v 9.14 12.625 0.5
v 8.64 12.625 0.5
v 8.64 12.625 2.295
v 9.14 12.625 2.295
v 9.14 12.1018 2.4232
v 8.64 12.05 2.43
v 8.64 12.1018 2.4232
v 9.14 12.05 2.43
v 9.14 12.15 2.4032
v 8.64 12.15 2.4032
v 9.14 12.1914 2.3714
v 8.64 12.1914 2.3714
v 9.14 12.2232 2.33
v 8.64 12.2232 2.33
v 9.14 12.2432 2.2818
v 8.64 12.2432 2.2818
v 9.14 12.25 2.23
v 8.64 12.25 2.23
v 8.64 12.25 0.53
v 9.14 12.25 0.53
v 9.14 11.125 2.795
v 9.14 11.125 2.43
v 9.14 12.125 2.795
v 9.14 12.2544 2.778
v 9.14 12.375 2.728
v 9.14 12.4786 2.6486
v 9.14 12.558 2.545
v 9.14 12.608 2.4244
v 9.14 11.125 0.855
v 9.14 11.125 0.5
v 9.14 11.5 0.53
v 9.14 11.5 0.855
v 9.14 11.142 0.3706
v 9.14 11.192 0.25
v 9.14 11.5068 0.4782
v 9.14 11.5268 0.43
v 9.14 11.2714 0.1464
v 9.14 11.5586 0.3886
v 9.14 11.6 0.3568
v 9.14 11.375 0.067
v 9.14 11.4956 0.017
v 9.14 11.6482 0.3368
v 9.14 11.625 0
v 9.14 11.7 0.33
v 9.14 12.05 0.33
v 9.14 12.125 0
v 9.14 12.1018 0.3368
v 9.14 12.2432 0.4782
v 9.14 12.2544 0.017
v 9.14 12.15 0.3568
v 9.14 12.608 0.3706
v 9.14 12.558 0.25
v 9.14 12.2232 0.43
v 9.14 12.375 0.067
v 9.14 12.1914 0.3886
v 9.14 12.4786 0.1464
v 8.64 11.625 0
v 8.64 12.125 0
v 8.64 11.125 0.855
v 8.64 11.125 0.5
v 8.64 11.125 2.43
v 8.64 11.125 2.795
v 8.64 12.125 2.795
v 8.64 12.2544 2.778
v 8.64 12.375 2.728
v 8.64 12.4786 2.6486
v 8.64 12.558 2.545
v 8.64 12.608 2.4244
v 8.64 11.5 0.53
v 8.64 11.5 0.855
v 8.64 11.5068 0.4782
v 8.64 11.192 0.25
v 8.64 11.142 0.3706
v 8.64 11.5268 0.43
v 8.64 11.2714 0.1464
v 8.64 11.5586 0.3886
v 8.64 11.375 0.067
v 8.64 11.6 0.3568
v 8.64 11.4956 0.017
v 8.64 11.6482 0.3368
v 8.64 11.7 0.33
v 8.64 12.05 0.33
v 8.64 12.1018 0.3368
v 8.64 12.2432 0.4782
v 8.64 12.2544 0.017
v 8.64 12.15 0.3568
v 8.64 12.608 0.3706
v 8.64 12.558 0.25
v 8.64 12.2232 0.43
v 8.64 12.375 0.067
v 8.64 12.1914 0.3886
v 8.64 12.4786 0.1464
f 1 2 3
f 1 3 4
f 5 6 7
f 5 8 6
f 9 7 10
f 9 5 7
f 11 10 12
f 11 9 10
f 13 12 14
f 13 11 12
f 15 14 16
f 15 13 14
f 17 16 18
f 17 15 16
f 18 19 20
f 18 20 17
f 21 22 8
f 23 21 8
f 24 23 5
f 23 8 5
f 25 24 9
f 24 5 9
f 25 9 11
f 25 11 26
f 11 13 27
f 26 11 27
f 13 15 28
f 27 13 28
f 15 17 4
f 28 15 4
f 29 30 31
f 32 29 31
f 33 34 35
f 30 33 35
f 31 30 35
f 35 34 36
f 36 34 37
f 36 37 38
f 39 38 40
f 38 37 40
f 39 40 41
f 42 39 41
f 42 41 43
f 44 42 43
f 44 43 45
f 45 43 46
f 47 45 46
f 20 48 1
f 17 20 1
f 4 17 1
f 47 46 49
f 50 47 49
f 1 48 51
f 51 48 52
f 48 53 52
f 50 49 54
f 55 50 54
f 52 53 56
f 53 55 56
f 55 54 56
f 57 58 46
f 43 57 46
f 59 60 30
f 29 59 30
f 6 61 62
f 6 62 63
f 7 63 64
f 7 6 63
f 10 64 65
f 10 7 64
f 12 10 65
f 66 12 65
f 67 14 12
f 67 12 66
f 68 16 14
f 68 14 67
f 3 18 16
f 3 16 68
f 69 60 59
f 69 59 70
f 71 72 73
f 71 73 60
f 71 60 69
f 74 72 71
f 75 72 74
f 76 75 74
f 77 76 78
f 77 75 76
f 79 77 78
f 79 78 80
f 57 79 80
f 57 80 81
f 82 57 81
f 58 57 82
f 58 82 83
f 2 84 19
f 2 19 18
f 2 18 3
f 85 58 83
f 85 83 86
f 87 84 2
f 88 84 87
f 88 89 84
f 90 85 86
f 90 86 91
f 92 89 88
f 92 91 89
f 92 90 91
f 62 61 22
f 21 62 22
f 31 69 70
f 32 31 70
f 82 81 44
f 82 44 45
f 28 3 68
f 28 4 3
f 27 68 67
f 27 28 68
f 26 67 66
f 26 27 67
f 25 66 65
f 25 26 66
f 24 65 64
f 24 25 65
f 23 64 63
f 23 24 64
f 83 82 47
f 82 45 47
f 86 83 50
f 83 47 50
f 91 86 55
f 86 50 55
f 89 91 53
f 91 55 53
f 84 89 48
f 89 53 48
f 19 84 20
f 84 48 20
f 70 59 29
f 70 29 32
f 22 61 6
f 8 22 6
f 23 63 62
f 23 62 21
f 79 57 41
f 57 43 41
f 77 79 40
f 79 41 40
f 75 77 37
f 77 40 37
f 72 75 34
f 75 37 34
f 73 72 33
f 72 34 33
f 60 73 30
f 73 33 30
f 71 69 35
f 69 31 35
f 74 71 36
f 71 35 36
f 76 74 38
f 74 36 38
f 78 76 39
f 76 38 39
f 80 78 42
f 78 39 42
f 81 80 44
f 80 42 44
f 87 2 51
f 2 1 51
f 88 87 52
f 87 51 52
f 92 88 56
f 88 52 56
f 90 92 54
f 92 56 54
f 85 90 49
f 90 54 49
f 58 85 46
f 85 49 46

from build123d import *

# Parameters (mm, degrees)
BOX086_W     = 0.5
BOX086_H     = 1.5
BOX086_DEPTH = 2.795
FILLET218_R  = 0.5
FILLET150_R  = 0.5
FILLET233_R  = 0.5
BOX082_W     = 0.75
BOX082_H     = 2.1
BOX082_DEPTH = 1
FILLET230_R  = 0.2
FILLET191_R  = 0.2
FILLET225_R  = 0.2
FILLET227_R  = 0.2
BOX083_W     = 1
BOX083_H     = 1.575
BOX083_DEPTH = 3


with BuildPart() as part:
    # Box086 → Box086 (join)
    with BuildSketch(Plane(origin=(-0.25, 11.125, 0), x_dir=(1, 0, 0), z_dir=(0, 0, 1))):
        with Locations((0.25, 0.75)):
            Rectangle(BOX086_W, BOX086_H)
    extrude(amount=BOX086_DEPTH)

    # Fillet218
    fillet218_edges = [part.edges().sort_by_distance(p)[0] for p in [
        (0, 12.625, 0),
    ]]
    fillet(fillet218_edges, radius=FILLET218_R)

    # Fillet150
    fillet150_edges = [part.edges().sort_by_distance(p)[0] for p in [
        (0, 12.625, 2.795),
    ]]
    fillet(fillet150_edges, radius=FILLET150_R)

    # Fillet233
    fillet233_edges = [part.edges().sort_by_distance(p)[0] for p in [
        (0, 11.125, 0),
    ]]
    fillet(fillet233_edges, radius=FILLET233_R)

    # Box082 → Box082 (cut)
    with BuildSketch(Plane(origin=(-0.5, 11.5, 0.33), x_dir=(0, 1, 0), z_dir=(1, 0, 0))):
        with Locations((0.375, 1.05)):
            Rectangle(BOX082_W, BOX082_H)
    extrude(amount=BOX082_DEPTH, mode=Mode.SUBTRACT)

    # Fillet230
    fillet230_edges = [part.edges().sort_by_distance(p)[0] for p in [
        (0, 11.5, 0.33),
    ]]
    fillet(fillet230_edges, radius=FILLET230_R)

    # Fillet191
    fillet191_edges = [part.edges().sort_by_distance(p)[0] for p in [
        (0, 12.25, 0.33),
    ]]
    fillet(fillet191_edges, radius=FILLET191_R)

    # Fillet225
    fillet225_edges = [part.edges().sort_by_distance(p)[0] for p in [
        (0, 11.5, 2.43),
    ]]
    fillet(fillet225_edges, radius=FILLET225_R)

    # Fillet227
    fillet227_edges = [part.edges().sort_by_distance(p)[0] for p in [
        (0, 12.25, 2.43),
    ]]
    fillet(fillet227_edges, radius=FILLET227_R)

    # Box083 → Box083 (cut)
    with BuildSketch(Plane(origin=(-1, 11, 0.855), x_dir=(0, 1, 0), z_dir=(1, 0, 0))):
        with Locations((0.5, 0.7875)):
            Rectangle(BOX083_W, BOX083_H)
    extrude(amount=BOX083_DEPTH, mode=Mode.SUBTRACT)


with BuildPart() as part_1:
    # Body032 placement: moved
    add(part.part.moved(Location((8.89, 0, 0))))


solid = part_1.part
